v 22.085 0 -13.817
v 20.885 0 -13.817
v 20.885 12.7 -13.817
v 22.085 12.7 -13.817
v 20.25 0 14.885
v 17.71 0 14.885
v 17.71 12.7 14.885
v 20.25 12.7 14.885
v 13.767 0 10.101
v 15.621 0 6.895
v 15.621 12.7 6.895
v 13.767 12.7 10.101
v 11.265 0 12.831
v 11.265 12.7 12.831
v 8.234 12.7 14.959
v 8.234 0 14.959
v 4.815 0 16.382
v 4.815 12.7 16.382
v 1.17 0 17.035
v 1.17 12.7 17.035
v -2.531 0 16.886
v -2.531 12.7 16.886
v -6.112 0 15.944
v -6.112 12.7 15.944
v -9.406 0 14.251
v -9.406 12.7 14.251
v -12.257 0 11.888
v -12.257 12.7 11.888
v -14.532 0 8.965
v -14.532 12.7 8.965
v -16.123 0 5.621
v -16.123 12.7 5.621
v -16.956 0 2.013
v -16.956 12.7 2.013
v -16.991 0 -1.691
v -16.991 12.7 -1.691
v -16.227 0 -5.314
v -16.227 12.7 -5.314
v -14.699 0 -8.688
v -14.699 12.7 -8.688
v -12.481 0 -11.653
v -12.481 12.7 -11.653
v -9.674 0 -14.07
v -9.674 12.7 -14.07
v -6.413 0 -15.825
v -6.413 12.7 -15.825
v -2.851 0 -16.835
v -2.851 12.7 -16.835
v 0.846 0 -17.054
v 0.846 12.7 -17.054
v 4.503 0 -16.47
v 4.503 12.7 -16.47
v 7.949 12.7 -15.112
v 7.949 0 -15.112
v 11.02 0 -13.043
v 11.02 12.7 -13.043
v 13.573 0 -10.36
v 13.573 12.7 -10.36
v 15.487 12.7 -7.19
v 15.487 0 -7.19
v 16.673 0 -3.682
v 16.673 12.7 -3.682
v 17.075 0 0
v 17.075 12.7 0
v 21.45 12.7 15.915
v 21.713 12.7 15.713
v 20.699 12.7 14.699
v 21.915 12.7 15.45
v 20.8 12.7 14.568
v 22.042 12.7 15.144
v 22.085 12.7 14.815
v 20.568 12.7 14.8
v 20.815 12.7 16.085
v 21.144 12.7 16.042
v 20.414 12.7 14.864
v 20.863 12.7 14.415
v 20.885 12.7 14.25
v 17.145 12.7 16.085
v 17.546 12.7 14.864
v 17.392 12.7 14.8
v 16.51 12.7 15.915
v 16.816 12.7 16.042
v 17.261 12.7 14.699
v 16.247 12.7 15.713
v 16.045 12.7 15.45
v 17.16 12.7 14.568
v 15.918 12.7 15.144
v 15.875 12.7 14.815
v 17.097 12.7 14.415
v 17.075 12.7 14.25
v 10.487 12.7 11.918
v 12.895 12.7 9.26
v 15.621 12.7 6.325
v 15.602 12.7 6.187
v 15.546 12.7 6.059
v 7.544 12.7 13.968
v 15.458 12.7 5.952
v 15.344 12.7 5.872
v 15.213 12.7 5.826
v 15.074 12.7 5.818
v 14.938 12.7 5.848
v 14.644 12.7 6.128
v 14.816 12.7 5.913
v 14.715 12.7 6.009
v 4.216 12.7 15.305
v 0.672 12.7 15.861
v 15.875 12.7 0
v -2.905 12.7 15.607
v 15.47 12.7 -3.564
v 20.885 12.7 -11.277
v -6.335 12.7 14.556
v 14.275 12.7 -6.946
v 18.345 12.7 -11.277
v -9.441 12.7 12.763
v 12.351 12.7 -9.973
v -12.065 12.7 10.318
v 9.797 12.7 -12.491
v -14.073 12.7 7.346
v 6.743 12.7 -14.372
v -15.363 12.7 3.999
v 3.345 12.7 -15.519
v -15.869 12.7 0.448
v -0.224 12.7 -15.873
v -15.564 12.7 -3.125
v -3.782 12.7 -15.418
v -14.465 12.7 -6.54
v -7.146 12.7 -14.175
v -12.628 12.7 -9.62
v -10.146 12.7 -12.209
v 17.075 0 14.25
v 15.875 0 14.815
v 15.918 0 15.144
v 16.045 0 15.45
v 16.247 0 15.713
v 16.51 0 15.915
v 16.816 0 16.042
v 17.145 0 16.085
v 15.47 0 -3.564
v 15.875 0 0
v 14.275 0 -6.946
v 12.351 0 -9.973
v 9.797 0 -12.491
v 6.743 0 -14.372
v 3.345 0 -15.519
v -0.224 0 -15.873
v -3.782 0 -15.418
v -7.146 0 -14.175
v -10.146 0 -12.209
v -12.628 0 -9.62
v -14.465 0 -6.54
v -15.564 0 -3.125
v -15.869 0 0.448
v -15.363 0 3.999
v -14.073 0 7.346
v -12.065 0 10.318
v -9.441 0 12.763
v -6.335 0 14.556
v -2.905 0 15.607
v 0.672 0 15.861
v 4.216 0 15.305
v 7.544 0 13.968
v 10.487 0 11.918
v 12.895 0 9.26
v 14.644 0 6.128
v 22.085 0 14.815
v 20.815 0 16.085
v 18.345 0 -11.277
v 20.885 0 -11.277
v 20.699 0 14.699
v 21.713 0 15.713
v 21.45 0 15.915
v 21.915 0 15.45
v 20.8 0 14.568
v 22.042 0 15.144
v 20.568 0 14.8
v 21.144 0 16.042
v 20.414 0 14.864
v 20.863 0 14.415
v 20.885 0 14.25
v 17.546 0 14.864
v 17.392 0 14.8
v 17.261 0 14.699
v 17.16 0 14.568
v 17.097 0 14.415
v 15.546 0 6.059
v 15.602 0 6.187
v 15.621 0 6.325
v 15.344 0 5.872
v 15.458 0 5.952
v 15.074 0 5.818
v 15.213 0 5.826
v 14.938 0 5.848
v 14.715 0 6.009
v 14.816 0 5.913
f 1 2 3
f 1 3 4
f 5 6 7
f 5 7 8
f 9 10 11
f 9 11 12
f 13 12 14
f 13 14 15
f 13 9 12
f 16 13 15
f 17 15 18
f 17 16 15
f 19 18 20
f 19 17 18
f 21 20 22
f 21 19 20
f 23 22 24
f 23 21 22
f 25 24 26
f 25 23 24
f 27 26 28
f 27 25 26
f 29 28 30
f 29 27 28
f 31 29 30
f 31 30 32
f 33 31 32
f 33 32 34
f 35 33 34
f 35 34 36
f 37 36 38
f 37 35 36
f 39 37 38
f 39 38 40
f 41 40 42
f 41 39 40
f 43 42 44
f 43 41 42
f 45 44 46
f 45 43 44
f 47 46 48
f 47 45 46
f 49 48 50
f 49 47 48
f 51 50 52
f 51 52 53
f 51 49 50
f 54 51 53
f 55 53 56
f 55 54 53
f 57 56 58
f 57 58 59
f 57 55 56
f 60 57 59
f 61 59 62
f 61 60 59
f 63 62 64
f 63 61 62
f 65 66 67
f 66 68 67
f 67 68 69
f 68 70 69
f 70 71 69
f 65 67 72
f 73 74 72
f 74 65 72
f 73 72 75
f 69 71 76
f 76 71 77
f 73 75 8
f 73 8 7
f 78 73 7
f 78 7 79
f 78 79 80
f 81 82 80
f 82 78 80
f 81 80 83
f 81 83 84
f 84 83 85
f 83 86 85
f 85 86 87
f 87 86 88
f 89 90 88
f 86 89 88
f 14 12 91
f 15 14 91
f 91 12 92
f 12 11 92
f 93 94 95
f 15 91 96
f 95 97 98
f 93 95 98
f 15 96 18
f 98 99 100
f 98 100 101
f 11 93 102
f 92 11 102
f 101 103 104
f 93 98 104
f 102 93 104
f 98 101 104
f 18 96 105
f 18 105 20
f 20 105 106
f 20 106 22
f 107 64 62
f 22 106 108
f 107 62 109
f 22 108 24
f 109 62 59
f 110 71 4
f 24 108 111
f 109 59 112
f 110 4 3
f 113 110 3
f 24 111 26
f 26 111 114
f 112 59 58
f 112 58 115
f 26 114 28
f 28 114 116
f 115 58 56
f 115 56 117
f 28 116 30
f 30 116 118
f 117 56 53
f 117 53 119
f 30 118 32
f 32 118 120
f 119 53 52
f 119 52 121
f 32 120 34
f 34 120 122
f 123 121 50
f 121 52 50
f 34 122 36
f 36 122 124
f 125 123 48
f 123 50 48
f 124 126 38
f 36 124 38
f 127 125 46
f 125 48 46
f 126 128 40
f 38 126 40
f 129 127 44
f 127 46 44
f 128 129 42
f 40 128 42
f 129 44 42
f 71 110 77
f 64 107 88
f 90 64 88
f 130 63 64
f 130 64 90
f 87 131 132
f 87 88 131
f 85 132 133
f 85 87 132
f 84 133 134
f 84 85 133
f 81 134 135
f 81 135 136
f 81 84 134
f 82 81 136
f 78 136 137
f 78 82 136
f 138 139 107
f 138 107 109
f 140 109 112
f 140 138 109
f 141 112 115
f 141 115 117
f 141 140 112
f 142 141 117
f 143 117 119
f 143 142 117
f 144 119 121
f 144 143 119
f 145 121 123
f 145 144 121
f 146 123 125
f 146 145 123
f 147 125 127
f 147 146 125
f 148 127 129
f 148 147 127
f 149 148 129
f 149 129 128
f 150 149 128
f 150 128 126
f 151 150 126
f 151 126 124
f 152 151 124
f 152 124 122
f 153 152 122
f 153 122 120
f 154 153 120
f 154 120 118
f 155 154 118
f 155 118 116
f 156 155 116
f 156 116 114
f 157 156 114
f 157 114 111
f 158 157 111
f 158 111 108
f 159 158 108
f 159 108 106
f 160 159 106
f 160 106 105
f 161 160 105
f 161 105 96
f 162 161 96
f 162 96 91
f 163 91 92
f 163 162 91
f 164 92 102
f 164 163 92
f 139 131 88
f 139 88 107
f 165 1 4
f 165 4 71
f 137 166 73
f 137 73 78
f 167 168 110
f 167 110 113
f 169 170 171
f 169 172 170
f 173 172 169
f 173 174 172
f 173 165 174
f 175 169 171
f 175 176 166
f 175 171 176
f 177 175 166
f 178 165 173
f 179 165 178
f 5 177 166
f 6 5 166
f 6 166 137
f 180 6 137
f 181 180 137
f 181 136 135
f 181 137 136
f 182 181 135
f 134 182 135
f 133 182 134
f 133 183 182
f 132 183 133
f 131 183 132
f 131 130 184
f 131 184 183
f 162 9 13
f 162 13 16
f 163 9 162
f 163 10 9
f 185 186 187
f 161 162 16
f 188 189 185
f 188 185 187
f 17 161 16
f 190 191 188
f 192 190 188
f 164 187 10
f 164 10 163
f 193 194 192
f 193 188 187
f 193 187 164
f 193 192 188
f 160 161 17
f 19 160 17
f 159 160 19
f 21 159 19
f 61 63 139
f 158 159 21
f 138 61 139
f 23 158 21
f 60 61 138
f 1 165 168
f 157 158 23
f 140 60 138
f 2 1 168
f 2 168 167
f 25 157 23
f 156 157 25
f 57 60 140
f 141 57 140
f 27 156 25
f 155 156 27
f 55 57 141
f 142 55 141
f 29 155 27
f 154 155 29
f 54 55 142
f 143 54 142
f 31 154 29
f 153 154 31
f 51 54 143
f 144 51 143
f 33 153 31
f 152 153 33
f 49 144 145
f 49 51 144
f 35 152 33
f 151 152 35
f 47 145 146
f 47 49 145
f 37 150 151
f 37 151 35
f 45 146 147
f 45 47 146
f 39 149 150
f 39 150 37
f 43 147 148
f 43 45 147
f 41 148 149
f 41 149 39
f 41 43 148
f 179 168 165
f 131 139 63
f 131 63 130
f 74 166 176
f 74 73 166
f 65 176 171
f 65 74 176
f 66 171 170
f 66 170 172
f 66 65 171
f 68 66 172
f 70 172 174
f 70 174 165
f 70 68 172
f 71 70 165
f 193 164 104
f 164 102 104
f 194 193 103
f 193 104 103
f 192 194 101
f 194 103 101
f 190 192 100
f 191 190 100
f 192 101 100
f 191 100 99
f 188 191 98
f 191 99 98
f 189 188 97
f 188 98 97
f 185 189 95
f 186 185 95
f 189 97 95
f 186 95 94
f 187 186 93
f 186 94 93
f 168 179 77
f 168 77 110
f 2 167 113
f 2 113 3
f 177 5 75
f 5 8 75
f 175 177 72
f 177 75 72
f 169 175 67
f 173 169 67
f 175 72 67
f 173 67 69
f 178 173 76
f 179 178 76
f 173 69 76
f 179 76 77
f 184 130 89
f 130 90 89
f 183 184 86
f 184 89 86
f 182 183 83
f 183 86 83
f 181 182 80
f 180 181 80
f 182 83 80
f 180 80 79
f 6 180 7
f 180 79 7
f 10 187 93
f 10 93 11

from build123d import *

# Parameters (mm, degrees)
BOSS_EXTRUDE1_DEPTH = 12.7
FILLET2_R           = 0.635
FILLET3_R           = 1.27
FILLET4_R           = 0.508


with BuildPart() as part:
    # Sketch1 → Boss-Extrude1 (new body)
    with BuildSketch(Plane(origin=(0, 0, 0), x_dir=(1, 0, 0), z_dir=(0, 1, 0))):
        with BuildLine():
            Line((17.075, 0), (17.075, -14.88542834))
            Line((17.075, -14.88542834), (20.885, -14.88542834))
            Line((20.885, -14.88542834), (20.885, 10.51457166))
            Line((20.885, 10.51457166), (20.885, 11.27657166))
            Line((20.885, 11.27657166), (18.345, 11.27657166))
            Line((18.345, 11.27657166), (20.885, 13.81657166))
            Line((20.885, 13.81657166), (22.085, 13.81657166))
            Line((22.085, 13.81657166), (22.085, 10.51457166))
            Line((22.085, 10.51457166), (22.085, -16.08542834))
            Line((22.085, -16.08542834), (15.875, -16.08542834))
            Line((15.875, -16.08542834), (15.875, 0))
            ThreePointArc((15.875, 0), (-15.811372489, 1.419903166), (15.621, -2.828424296))
            Line((15.621, -2.828424296), (15.621, -6.89492451))
            ThreePointArc((15.621, -6.89492451), (-16.707546199, 3.52328327), (17.075, 0))
        make_face()
    extrude(amount=BOSS_EXTRUDE1_DEPTH)

    # Fillet2
    fillet2_edges = [part.edges().sort_by_distance(p)[0] for p in [
        (17.075, 6.35, 14.88542834),
        (20.885, 6.35, 14.88542834),
    ]]
    fillet(fillet2_edges, radius=FILLET2_R)

    # Fillet3
    fillet3_edges = [part.edges().sort_by_distance(p)[0] for p in [
        (22.085, 6.35, 16.08542834),
        (15.875, 6.35, 16.08542834),
    ]]
    fillet(fillet3_edges, radius=FILLET3_R)

    # Fillet4
    fillet4_edges = [part.edges().sort_by_distance(p)[0] for p in [
        (15.621, 6.35, 2.828424296),
    ]]
    fillet(fillet4_edges, radius=FILLET4_R)


solid = part.part
